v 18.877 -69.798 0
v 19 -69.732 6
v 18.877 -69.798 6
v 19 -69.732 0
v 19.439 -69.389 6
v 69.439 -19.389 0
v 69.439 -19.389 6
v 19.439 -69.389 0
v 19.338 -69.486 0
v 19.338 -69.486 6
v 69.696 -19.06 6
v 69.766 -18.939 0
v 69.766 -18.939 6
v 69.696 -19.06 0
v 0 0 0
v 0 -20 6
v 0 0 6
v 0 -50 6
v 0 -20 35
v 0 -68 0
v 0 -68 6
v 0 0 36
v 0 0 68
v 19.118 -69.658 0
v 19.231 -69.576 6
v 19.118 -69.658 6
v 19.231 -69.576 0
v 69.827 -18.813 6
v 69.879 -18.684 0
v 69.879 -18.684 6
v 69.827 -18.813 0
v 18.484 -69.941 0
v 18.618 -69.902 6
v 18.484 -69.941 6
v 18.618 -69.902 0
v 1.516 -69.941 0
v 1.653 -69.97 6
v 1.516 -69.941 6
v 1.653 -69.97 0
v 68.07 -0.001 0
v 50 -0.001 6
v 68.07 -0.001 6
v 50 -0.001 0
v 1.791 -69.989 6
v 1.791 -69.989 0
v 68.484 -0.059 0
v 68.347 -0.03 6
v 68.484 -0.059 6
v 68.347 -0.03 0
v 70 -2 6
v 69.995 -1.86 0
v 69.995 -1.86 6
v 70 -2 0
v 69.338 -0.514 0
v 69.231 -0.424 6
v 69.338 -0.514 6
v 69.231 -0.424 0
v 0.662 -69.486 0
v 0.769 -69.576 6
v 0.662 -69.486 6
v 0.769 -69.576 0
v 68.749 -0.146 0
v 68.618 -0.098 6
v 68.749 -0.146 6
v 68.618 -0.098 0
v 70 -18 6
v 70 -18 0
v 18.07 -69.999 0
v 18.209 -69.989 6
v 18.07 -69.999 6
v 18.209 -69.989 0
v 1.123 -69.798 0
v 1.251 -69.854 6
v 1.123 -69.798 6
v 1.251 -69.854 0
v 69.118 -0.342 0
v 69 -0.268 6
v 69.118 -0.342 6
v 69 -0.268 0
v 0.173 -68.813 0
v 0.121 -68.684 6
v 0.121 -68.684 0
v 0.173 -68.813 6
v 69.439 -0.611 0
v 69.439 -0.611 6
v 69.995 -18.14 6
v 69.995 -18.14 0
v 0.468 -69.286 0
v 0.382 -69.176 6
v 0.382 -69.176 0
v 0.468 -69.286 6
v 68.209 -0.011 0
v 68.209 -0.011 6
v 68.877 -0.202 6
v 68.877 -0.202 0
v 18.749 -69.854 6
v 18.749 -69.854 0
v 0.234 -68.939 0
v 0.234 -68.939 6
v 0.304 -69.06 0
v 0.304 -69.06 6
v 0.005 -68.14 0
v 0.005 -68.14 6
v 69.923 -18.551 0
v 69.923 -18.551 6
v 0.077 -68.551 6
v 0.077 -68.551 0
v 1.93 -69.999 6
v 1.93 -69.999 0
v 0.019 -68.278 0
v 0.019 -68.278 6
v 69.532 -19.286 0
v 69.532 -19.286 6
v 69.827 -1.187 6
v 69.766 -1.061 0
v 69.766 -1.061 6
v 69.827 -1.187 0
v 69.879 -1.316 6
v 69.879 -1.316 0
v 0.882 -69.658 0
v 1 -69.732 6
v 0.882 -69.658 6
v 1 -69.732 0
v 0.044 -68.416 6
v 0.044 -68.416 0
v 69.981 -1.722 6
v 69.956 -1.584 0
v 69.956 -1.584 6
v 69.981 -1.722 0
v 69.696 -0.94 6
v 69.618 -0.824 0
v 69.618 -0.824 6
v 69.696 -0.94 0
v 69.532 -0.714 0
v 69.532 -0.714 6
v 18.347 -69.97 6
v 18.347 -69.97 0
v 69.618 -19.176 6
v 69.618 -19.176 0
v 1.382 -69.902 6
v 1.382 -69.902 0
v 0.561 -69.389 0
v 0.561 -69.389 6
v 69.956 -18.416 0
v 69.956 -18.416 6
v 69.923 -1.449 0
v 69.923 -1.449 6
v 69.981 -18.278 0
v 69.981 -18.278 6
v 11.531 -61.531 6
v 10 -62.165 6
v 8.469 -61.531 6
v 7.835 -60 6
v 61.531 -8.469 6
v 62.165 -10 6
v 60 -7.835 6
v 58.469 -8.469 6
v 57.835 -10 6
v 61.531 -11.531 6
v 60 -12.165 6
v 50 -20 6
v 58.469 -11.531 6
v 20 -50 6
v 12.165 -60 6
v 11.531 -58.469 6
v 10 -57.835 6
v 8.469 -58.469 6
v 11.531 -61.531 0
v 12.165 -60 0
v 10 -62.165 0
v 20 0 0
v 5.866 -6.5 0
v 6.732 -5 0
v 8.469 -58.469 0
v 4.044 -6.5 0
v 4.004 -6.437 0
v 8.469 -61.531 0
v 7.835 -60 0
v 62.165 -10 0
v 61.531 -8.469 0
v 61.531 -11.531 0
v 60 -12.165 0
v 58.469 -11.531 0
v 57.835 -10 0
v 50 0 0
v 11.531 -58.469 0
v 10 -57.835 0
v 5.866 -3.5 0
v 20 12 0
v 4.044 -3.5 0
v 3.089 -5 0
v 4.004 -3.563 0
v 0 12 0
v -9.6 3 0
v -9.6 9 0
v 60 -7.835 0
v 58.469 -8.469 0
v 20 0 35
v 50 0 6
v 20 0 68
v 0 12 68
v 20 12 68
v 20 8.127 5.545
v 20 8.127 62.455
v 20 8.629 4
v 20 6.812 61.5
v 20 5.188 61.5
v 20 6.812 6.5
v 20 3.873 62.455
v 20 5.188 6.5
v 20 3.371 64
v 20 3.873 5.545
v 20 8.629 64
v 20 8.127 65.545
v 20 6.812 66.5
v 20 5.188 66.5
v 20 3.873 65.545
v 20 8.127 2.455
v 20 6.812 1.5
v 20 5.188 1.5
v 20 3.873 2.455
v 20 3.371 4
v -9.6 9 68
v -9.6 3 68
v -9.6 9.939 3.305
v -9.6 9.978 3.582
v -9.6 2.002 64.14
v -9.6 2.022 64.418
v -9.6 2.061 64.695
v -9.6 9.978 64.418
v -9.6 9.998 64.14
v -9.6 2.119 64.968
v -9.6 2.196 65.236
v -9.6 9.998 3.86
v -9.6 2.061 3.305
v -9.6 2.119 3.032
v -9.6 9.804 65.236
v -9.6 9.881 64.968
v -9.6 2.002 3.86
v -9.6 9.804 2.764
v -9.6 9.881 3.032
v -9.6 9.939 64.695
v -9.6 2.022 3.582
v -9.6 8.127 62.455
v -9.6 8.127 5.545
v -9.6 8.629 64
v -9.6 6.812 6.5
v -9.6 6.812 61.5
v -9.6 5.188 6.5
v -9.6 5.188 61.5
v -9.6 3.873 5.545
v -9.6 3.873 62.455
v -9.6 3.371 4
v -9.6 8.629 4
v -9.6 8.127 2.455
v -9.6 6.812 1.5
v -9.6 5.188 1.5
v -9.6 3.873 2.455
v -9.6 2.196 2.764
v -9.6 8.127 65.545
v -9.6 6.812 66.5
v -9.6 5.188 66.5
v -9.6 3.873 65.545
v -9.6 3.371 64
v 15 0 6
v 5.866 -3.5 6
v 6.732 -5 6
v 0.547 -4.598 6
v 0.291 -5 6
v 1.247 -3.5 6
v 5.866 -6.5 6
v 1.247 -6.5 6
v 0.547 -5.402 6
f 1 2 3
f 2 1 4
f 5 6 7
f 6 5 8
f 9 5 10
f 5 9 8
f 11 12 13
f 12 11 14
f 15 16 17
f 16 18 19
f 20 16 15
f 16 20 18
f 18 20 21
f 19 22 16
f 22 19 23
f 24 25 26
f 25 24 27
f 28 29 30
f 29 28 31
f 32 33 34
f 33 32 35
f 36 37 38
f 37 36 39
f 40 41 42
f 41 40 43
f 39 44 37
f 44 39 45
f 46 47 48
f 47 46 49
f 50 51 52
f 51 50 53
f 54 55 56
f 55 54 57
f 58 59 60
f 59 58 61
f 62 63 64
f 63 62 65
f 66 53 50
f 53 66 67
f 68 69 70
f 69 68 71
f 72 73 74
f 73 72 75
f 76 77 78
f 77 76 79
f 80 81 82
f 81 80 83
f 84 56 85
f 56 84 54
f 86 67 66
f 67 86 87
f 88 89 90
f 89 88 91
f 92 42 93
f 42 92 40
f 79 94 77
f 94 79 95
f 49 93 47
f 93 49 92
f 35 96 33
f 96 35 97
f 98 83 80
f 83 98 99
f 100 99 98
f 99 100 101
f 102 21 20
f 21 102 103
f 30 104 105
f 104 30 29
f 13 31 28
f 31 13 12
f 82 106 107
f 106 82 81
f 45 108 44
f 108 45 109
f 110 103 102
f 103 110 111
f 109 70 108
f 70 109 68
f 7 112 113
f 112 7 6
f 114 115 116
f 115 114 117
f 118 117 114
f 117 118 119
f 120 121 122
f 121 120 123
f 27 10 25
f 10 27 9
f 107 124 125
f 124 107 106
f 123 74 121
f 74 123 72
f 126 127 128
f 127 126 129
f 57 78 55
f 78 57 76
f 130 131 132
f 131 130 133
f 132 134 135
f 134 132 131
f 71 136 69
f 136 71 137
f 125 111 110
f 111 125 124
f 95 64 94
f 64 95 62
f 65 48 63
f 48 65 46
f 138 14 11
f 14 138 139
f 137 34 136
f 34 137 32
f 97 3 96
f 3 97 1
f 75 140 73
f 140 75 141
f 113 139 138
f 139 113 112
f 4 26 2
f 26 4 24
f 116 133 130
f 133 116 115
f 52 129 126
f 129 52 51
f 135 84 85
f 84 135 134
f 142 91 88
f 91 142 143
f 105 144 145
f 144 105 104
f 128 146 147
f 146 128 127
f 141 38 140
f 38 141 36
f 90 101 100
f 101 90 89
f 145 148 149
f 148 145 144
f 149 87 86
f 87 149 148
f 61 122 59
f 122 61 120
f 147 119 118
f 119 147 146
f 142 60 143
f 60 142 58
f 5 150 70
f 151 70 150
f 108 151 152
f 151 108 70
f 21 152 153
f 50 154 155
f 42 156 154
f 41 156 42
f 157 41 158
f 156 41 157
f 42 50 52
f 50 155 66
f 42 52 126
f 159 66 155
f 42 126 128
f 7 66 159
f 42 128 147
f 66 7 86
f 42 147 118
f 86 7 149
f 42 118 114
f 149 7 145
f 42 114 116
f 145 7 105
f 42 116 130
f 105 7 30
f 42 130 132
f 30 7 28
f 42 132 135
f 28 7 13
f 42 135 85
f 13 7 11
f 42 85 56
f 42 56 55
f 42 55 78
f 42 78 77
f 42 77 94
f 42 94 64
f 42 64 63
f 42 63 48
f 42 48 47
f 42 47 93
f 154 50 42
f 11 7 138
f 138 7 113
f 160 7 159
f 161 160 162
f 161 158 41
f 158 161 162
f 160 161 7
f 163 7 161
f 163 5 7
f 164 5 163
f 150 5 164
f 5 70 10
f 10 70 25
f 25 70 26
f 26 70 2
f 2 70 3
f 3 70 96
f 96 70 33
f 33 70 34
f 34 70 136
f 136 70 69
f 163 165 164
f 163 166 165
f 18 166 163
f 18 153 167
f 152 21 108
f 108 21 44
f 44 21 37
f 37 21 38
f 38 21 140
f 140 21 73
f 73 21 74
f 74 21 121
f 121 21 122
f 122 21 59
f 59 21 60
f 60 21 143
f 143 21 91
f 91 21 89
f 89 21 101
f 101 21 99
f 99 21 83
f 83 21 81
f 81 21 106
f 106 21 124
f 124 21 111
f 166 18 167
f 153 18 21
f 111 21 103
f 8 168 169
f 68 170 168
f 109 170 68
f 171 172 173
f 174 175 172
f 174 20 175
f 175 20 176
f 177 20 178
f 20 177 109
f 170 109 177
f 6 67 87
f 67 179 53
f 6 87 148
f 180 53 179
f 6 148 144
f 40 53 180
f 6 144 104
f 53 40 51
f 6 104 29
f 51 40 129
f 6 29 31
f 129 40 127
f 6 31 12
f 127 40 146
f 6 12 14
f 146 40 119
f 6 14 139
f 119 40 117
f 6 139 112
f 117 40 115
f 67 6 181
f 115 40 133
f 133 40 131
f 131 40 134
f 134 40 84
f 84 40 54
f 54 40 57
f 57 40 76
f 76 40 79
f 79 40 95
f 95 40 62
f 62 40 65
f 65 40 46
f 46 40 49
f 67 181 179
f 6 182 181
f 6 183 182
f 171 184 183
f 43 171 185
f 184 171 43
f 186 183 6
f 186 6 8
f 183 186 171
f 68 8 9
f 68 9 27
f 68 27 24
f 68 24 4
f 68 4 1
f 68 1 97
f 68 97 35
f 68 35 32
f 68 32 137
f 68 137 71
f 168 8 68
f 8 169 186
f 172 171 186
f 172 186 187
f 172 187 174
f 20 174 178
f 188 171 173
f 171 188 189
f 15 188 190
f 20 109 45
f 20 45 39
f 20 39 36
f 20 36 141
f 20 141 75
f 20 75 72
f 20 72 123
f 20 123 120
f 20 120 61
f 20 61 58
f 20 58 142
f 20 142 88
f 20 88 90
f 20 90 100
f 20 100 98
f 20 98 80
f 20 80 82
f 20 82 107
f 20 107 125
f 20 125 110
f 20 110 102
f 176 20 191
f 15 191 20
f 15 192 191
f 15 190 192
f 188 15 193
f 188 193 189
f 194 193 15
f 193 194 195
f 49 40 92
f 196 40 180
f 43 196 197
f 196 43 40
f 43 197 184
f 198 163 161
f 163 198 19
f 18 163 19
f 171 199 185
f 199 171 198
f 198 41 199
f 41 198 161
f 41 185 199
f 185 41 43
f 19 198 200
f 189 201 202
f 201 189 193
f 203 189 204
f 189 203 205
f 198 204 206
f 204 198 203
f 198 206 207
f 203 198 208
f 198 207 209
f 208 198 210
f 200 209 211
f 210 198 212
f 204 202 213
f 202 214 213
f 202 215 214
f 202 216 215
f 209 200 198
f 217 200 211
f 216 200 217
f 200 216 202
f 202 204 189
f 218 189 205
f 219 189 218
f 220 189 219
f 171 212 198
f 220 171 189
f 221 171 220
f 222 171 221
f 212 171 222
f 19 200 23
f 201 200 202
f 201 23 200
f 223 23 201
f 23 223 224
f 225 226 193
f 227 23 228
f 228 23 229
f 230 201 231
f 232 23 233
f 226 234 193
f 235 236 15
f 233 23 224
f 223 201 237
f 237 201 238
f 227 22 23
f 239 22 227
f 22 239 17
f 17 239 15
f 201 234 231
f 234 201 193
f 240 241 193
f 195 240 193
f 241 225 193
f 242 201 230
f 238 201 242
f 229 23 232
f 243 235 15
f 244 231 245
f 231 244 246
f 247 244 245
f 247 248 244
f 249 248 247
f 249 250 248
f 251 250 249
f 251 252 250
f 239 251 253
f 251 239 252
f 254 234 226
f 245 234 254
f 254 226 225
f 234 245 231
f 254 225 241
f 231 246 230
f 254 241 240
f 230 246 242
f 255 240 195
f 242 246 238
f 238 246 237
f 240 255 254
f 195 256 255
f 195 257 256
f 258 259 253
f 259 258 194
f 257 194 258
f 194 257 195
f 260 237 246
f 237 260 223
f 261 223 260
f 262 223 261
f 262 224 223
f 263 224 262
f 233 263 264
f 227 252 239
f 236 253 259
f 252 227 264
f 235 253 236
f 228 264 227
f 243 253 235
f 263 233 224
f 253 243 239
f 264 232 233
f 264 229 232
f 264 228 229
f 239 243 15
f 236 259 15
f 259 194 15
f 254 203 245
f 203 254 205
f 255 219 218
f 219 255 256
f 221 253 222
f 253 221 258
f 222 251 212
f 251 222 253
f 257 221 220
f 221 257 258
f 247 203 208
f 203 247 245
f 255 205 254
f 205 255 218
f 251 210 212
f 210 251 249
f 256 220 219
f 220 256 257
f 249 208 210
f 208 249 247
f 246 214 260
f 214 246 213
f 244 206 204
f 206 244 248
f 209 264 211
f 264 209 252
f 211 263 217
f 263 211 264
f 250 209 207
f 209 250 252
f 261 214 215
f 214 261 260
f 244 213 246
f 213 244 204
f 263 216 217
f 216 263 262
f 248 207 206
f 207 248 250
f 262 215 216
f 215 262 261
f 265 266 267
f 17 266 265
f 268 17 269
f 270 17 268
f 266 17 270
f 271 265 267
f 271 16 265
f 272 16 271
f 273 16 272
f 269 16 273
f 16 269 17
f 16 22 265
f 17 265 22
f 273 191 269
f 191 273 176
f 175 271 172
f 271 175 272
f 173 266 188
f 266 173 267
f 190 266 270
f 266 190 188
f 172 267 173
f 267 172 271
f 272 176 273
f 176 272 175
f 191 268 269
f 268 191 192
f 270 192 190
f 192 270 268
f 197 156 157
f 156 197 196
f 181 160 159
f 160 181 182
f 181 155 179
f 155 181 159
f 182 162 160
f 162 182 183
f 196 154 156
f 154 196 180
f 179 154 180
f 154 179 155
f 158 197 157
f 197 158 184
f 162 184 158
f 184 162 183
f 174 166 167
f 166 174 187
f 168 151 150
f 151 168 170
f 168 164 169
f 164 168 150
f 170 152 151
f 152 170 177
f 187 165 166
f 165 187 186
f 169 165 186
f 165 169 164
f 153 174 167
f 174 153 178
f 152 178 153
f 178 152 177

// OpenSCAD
// file: polyhole.scad
// The Cylinder is dead! Long live the Cylinder!
// A module for a polyhole by radius, based on Nophead's work.

module polyhole(h, r)
{
    n = max(round(4 * r), 3);
    cylinder(h = h, r = r / cos(180 / n), $fn = n);
}
// file: BedMountC.scad
// A corner mount for the bed, which uses two V wheels. Uses 40mm m5 bolts to mount the wheels

use<polyhole.scad>

BedMountC();

module BedMountC()
{
    difference()
    {
        union()
        {
            hull()
            {
                translate([10, 10, 3])
                    cube([20, 20, 6], center = true);
                translate([68, 2, 0])
                    cylinder(h = 6, r = 2, $fn = 90);
                translate([68, 18, 0])
                    cylinder(h = 6, r = 2, $fn = 90);
                translate([2, 68, 0])
                    cylinder(h = 6, r = 2, $fn = 90);
                translate([18, 68, 0])
                    cylinder(h = 6, r = 2, $fn = 90);
            }
            hull()
            {
                linear_extrude(height = 35)
                    polygon([[0, 0], [20, 0], [0, 20]]);
                linear_extrude(height = 6)
                    polygon([[0, 0], [50, 0], [50, 20], [20, 50], [0, 50]]);
            }
            hull()
            {
                linear_extrude(height = 35)
                    polygon([[0, 0], [20, 0], [0, 20]]);
                linear_extrude(height = 68)
                    polygon([[0, -12], [20, -12], [20, 0], [0, 0]]);
            }
            linear_extrude(height = 20)
                polygon([[0, -12], [20, -12], [20, 0], [0, 0]]);
            hull()
            {
                hull()
                {
                    dist = 5; //distance from edge of bed to v slot extrusion
                    translate([-dist, -6, 1])
                        cube([(10-5.40)*2, 6, 2], center = true);
                    translate([-dist, -6, 4])
                        rotate([0, 90, 0])
                            cylinder(h = (10-5.40)*2, r = 4, $fn = 90, center = true);
                    translate([-dist, -6, 64])
                        rotate([0, 90, 0])
                            cylinder(h = (10-5.40)*2, r = 4, $fn = 90, center = true);
                    translate([-dist, -6, 67])
                        cube([(10-5.40)*2, 6, 2], center = true);
                }
                linear_extrude(height = 68)
                    polygon([[0, -12], [20, -12], [20, 0], [0, 0]]);
            }
        }
        translate([20, -6, 4])
            rotate([90, 0, -90])
                polyhole(30, 2.5);
        translate([20, -6, 64])
            rotate([90, 0, -90])
                polyhole(30, 2.5);
        translate([0, 0, 6])
            linear_extrude(height = 30, scale = 0)
                polygon([[0, 0], [15, 0], [0, 20]]);
        hull()
        {
            translate([5, 5, 0])
                polyhole(6, 1.5);
            translate([5, 5, 0])
                rotate([0, -25, 0])
                    polyhole(10, 1.5);
        }
        translate([60, 10, 0])
            polyhole(6, 2);
        translate([10, 60, 0])
            polyhole(6, 2);
    }
}
// main file
//Other side of the bed mount with two wheels

use<BedMountC.scad>

BedMountCMirror();

module BedMountCMirror()
{
    scale([1, -1, 1])
        BedMountC();
}
